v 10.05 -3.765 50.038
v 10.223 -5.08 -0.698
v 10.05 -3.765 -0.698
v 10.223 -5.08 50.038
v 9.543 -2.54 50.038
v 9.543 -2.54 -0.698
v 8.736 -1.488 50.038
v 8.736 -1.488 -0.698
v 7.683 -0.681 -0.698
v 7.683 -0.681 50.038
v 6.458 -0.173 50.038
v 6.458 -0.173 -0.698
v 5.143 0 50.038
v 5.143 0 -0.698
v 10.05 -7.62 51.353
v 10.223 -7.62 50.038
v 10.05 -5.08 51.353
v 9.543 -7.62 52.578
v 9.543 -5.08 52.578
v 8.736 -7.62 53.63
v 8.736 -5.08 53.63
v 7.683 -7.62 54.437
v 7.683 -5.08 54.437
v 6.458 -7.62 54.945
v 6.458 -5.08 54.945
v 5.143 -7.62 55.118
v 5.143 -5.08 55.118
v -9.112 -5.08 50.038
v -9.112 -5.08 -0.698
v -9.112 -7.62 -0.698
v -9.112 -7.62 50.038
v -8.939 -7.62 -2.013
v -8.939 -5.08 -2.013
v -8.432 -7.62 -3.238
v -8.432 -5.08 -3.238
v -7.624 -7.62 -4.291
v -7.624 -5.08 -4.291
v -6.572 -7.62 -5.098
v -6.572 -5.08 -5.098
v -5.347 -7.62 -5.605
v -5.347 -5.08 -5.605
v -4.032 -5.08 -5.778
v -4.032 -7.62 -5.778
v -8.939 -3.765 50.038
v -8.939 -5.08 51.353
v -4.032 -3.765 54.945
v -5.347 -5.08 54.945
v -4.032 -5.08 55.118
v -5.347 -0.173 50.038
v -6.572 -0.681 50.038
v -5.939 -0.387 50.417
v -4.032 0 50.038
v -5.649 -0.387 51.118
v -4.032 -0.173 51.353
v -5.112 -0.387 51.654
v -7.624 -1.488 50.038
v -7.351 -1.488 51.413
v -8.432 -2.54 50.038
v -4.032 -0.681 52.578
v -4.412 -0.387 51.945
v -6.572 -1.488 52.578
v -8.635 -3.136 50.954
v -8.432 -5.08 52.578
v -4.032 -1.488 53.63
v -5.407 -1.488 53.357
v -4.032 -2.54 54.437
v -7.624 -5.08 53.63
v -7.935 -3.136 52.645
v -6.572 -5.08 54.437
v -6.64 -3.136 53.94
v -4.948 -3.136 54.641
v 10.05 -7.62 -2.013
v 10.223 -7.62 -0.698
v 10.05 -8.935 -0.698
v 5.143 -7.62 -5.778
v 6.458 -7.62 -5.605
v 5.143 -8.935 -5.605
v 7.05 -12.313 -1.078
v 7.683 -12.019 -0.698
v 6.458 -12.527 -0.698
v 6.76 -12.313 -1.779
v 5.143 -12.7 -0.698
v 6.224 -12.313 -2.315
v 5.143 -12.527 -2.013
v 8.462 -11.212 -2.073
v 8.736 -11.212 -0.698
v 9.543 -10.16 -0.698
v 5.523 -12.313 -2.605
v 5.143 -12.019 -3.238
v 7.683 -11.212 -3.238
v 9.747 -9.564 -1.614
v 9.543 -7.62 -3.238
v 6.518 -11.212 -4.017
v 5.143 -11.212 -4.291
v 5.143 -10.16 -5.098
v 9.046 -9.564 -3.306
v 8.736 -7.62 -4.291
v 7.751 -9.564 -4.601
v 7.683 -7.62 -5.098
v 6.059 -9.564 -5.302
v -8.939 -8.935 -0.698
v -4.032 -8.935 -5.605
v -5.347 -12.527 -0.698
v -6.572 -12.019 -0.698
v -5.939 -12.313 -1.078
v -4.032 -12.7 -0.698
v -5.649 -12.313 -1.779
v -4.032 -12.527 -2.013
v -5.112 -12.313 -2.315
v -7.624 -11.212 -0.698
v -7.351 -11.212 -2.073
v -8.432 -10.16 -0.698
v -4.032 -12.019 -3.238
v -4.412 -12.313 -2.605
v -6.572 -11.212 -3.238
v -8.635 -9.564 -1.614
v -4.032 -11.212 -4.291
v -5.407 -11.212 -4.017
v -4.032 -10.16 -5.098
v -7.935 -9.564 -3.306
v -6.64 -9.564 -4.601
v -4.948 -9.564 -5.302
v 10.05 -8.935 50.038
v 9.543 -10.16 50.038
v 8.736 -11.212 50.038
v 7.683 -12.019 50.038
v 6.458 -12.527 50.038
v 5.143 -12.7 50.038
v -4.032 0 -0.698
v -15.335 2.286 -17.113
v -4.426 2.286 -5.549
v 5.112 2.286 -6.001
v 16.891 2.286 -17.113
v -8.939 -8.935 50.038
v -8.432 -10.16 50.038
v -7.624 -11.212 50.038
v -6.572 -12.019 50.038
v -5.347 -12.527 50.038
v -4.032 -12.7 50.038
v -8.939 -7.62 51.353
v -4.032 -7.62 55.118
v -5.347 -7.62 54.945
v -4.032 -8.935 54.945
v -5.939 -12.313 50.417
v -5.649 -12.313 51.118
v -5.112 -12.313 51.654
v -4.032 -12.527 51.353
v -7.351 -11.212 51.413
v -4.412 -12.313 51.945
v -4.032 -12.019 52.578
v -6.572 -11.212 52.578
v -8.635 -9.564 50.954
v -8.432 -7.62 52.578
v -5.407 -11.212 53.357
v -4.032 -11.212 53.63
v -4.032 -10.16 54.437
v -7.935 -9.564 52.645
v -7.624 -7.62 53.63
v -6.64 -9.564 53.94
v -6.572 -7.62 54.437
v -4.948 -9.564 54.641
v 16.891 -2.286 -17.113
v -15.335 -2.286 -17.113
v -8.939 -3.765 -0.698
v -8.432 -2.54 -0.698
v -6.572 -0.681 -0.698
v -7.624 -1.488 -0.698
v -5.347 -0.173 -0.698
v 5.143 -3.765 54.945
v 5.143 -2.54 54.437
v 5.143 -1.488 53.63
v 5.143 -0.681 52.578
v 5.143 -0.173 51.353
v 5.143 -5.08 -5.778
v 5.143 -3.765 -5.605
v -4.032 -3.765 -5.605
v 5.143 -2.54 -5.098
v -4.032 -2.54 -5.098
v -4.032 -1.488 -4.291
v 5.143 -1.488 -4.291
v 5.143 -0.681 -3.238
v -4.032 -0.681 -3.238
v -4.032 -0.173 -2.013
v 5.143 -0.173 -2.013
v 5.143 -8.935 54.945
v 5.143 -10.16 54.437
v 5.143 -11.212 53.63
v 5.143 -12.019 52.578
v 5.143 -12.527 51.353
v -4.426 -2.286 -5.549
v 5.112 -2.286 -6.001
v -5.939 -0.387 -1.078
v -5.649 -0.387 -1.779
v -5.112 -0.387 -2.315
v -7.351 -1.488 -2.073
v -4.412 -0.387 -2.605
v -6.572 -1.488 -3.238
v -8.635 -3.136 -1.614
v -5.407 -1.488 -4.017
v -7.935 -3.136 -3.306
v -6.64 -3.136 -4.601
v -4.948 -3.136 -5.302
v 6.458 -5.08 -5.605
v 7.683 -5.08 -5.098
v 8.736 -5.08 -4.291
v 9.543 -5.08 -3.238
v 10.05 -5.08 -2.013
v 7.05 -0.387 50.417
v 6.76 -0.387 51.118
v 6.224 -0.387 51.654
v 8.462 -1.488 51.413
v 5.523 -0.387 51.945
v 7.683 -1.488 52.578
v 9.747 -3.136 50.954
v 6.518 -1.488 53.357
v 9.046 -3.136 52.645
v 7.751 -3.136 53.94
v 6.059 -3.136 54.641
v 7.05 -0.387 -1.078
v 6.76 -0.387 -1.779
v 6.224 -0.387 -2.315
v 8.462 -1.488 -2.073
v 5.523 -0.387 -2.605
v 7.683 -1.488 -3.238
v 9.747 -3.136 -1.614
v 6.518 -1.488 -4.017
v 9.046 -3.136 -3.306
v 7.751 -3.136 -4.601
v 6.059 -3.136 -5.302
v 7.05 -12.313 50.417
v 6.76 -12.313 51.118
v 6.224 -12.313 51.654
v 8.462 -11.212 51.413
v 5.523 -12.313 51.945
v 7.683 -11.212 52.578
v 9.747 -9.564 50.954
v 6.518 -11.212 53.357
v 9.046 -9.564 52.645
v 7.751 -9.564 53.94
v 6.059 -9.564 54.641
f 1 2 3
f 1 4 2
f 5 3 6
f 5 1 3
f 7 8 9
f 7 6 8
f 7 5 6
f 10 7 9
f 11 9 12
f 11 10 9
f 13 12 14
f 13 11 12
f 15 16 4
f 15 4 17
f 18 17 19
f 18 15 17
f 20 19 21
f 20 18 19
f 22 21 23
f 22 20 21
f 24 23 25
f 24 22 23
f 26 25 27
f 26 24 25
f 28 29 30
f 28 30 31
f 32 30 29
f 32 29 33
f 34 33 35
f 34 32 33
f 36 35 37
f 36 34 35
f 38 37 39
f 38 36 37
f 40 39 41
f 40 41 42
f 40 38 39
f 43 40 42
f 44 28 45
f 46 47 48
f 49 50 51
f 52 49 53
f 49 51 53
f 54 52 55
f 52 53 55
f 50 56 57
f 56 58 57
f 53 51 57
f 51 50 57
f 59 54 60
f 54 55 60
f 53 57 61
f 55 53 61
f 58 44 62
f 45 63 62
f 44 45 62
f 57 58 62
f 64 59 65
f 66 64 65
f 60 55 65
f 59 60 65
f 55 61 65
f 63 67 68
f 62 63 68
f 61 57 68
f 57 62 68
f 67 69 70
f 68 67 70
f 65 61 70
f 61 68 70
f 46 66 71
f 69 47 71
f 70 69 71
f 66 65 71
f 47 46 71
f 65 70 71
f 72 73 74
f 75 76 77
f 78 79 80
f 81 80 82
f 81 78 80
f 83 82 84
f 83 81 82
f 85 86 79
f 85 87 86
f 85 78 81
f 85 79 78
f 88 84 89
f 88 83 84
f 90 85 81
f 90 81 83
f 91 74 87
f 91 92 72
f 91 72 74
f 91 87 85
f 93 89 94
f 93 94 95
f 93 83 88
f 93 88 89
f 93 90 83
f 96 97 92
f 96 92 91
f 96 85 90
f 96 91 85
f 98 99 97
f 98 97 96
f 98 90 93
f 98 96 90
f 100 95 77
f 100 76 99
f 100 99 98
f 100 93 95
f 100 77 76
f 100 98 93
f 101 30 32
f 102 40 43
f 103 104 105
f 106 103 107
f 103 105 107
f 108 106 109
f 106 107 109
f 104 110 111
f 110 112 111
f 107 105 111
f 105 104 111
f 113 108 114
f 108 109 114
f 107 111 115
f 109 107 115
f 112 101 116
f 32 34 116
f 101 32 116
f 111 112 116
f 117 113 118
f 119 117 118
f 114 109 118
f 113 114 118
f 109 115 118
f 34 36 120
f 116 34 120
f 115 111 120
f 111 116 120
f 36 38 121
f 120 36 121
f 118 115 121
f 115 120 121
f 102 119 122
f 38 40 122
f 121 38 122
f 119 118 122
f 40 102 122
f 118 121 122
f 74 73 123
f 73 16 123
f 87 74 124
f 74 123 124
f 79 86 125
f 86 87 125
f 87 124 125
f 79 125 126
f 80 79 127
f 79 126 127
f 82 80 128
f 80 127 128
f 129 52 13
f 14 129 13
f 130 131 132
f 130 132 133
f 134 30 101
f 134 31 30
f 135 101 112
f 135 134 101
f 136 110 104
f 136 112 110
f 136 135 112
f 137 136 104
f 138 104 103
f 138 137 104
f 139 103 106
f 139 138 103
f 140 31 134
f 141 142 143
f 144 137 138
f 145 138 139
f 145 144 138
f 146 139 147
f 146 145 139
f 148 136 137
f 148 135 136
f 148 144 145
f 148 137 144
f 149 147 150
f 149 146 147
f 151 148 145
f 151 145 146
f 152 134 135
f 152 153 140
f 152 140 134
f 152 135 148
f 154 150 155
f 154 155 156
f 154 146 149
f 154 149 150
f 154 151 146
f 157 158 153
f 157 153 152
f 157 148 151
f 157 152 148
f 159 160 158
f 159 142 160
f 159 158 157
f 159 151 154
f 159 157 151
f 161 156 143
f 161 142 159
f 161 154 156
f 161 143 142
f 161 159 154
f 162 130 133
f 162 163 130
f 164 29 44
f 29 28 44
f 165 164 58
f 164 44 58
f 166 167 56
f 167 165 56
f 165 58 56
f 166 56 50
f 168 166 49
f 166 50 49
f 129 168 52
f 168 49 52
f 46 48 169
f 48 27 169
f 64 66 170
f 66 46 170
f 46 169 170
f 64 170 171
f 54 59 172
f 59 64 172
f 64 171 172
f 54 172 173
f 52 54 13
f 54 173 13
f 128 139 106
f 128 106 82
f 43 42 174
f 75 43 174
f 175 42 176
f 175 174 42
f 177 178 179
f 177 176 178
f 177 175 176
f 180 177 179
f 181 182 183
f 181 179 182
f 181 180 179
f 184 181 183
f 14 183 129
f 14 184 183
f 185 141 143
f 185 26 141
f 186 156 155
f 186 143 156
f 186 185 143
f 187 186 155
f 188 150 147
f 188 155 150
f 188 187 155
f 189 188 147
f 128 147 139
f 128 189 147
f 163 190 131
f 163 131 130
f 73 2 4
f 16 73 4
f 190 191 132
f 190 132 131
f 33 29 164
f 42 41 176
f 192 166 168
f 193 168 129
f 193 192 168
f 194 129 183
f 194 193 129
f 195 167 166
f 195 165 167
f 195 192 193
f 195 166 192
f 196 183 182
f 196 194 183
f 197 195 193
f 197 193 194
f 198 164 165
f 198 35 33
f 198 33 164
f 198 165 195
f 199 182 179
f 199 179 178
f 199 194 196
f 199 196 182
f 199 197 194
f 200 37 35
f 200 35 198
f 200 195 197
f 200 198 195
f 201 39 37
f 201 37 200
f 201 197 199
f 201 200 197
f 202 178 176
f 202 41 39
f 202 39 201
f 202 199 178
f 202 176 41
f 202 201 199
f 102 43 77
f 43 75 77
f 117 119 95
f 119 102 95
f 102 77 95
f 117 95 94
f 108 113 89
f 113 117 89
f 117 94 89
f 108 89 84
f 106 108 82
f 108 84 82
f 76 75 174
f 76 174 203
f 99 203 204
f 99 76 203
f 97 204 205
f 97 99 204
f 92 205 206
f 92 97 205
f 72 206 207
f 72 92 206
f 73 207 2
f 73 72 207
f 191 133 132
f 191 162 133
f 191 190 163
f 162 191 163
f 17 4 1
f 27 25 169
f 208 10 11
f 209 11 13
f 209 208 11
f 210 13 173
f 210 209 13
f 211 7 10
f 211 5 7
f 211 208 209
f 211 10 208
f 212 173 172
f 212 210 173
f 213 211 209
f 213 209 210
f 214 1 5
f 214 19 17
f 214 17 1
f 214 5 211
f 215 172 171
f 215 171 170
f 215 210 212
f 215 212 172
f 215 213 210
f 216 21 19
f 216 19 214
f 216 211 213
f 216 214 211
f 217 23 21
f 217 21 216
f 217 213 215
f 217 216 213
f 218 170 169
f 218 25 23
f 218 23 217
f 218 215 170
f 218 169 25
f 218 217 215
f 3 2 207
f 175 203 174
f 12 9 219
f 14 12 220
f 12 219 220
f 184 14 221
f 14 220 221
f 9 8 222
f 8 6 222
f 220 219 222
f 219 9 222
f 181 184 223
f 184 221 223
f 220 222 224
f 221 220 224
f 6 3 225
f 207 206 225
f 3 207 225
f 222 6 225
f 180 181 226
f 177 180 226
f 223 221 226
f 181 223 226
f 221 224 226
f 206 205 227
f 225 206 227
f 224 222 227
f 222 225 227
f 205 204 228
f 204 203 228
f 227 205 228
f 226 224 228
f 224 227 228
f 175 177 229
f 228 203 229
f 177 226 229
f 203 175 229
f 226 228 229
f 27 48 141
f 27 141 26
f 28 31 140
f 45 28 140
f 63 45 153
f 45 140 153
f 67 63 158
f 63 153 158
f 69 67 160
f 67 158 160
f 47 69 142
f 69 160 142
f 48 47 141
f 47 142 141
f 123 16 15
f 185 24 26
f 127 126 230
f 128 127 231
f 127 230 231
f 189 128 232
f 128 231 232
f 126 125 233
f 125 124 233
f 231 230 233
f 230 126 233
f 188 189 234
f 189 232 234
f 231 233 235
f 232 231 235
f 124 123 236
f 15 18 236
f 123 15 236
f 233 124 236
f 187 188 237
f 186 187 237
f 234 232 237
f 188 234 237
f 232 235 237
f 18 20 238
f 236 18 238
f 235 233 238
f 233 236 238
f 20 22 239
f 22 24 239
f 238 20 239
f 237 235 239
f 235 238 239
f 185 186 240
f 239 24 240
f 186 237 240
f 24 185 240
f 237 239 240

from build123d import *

# Parameters (mm, degrees)
F0_W     = 19.335749
F0_H     = 60.896502
F1_DEPTH = 12.7
F2_R     = 5.08
F4_DEPTH = 2.286


with BuildPart() as f1:
    # F0 (on Front) → F1 (new body)
    with BuildSketch(Plane.XZ):
        with Locations((0.555625, 24.669751)):
            Rectangle(F0_W, F0_H)
    extrude(amount=F1_DEPTH)

    # F2
    f2_edges = [f1.edges().sort_by_distance(p)[0] for p in [
        (-9.11225, -6.35, 55.118002),
        (-9.11225, -6.35, -5.7785),
        (-9.11225, 0, 24.669751),
        (-9.11225, -12.7, 24.669751),
        (10.223499, -6.35, -5.7785),
        (10.223499, -6.35, 55.118002),
        (10.223499, 0, 24.669751),
        (10.223499, -12.7, 24.669751),
        (0.555625, 0, -5.7785),
        (0.555625, -12.7, -5.7785),
        (0.555625, 0, 55.118002),
        (0.555625, -12.7, 55.118002),
    ]]
    fillet(f2_edges, radius=F2_R)


with BuildPart() as f4:
    # F3 (on Front) → F4 (new body, symmetric)
    with BuildSketch(Plane.XZ):
        Polygon((16.891001, -17.11325), (5.11175, -6.00075), (-4.425785, -5.549217), (-15.33525, -17.11325), align=None)
    extrude(amount=F4_DEPTH, both=True)


solid = Compound([f1.part, f4.part])
